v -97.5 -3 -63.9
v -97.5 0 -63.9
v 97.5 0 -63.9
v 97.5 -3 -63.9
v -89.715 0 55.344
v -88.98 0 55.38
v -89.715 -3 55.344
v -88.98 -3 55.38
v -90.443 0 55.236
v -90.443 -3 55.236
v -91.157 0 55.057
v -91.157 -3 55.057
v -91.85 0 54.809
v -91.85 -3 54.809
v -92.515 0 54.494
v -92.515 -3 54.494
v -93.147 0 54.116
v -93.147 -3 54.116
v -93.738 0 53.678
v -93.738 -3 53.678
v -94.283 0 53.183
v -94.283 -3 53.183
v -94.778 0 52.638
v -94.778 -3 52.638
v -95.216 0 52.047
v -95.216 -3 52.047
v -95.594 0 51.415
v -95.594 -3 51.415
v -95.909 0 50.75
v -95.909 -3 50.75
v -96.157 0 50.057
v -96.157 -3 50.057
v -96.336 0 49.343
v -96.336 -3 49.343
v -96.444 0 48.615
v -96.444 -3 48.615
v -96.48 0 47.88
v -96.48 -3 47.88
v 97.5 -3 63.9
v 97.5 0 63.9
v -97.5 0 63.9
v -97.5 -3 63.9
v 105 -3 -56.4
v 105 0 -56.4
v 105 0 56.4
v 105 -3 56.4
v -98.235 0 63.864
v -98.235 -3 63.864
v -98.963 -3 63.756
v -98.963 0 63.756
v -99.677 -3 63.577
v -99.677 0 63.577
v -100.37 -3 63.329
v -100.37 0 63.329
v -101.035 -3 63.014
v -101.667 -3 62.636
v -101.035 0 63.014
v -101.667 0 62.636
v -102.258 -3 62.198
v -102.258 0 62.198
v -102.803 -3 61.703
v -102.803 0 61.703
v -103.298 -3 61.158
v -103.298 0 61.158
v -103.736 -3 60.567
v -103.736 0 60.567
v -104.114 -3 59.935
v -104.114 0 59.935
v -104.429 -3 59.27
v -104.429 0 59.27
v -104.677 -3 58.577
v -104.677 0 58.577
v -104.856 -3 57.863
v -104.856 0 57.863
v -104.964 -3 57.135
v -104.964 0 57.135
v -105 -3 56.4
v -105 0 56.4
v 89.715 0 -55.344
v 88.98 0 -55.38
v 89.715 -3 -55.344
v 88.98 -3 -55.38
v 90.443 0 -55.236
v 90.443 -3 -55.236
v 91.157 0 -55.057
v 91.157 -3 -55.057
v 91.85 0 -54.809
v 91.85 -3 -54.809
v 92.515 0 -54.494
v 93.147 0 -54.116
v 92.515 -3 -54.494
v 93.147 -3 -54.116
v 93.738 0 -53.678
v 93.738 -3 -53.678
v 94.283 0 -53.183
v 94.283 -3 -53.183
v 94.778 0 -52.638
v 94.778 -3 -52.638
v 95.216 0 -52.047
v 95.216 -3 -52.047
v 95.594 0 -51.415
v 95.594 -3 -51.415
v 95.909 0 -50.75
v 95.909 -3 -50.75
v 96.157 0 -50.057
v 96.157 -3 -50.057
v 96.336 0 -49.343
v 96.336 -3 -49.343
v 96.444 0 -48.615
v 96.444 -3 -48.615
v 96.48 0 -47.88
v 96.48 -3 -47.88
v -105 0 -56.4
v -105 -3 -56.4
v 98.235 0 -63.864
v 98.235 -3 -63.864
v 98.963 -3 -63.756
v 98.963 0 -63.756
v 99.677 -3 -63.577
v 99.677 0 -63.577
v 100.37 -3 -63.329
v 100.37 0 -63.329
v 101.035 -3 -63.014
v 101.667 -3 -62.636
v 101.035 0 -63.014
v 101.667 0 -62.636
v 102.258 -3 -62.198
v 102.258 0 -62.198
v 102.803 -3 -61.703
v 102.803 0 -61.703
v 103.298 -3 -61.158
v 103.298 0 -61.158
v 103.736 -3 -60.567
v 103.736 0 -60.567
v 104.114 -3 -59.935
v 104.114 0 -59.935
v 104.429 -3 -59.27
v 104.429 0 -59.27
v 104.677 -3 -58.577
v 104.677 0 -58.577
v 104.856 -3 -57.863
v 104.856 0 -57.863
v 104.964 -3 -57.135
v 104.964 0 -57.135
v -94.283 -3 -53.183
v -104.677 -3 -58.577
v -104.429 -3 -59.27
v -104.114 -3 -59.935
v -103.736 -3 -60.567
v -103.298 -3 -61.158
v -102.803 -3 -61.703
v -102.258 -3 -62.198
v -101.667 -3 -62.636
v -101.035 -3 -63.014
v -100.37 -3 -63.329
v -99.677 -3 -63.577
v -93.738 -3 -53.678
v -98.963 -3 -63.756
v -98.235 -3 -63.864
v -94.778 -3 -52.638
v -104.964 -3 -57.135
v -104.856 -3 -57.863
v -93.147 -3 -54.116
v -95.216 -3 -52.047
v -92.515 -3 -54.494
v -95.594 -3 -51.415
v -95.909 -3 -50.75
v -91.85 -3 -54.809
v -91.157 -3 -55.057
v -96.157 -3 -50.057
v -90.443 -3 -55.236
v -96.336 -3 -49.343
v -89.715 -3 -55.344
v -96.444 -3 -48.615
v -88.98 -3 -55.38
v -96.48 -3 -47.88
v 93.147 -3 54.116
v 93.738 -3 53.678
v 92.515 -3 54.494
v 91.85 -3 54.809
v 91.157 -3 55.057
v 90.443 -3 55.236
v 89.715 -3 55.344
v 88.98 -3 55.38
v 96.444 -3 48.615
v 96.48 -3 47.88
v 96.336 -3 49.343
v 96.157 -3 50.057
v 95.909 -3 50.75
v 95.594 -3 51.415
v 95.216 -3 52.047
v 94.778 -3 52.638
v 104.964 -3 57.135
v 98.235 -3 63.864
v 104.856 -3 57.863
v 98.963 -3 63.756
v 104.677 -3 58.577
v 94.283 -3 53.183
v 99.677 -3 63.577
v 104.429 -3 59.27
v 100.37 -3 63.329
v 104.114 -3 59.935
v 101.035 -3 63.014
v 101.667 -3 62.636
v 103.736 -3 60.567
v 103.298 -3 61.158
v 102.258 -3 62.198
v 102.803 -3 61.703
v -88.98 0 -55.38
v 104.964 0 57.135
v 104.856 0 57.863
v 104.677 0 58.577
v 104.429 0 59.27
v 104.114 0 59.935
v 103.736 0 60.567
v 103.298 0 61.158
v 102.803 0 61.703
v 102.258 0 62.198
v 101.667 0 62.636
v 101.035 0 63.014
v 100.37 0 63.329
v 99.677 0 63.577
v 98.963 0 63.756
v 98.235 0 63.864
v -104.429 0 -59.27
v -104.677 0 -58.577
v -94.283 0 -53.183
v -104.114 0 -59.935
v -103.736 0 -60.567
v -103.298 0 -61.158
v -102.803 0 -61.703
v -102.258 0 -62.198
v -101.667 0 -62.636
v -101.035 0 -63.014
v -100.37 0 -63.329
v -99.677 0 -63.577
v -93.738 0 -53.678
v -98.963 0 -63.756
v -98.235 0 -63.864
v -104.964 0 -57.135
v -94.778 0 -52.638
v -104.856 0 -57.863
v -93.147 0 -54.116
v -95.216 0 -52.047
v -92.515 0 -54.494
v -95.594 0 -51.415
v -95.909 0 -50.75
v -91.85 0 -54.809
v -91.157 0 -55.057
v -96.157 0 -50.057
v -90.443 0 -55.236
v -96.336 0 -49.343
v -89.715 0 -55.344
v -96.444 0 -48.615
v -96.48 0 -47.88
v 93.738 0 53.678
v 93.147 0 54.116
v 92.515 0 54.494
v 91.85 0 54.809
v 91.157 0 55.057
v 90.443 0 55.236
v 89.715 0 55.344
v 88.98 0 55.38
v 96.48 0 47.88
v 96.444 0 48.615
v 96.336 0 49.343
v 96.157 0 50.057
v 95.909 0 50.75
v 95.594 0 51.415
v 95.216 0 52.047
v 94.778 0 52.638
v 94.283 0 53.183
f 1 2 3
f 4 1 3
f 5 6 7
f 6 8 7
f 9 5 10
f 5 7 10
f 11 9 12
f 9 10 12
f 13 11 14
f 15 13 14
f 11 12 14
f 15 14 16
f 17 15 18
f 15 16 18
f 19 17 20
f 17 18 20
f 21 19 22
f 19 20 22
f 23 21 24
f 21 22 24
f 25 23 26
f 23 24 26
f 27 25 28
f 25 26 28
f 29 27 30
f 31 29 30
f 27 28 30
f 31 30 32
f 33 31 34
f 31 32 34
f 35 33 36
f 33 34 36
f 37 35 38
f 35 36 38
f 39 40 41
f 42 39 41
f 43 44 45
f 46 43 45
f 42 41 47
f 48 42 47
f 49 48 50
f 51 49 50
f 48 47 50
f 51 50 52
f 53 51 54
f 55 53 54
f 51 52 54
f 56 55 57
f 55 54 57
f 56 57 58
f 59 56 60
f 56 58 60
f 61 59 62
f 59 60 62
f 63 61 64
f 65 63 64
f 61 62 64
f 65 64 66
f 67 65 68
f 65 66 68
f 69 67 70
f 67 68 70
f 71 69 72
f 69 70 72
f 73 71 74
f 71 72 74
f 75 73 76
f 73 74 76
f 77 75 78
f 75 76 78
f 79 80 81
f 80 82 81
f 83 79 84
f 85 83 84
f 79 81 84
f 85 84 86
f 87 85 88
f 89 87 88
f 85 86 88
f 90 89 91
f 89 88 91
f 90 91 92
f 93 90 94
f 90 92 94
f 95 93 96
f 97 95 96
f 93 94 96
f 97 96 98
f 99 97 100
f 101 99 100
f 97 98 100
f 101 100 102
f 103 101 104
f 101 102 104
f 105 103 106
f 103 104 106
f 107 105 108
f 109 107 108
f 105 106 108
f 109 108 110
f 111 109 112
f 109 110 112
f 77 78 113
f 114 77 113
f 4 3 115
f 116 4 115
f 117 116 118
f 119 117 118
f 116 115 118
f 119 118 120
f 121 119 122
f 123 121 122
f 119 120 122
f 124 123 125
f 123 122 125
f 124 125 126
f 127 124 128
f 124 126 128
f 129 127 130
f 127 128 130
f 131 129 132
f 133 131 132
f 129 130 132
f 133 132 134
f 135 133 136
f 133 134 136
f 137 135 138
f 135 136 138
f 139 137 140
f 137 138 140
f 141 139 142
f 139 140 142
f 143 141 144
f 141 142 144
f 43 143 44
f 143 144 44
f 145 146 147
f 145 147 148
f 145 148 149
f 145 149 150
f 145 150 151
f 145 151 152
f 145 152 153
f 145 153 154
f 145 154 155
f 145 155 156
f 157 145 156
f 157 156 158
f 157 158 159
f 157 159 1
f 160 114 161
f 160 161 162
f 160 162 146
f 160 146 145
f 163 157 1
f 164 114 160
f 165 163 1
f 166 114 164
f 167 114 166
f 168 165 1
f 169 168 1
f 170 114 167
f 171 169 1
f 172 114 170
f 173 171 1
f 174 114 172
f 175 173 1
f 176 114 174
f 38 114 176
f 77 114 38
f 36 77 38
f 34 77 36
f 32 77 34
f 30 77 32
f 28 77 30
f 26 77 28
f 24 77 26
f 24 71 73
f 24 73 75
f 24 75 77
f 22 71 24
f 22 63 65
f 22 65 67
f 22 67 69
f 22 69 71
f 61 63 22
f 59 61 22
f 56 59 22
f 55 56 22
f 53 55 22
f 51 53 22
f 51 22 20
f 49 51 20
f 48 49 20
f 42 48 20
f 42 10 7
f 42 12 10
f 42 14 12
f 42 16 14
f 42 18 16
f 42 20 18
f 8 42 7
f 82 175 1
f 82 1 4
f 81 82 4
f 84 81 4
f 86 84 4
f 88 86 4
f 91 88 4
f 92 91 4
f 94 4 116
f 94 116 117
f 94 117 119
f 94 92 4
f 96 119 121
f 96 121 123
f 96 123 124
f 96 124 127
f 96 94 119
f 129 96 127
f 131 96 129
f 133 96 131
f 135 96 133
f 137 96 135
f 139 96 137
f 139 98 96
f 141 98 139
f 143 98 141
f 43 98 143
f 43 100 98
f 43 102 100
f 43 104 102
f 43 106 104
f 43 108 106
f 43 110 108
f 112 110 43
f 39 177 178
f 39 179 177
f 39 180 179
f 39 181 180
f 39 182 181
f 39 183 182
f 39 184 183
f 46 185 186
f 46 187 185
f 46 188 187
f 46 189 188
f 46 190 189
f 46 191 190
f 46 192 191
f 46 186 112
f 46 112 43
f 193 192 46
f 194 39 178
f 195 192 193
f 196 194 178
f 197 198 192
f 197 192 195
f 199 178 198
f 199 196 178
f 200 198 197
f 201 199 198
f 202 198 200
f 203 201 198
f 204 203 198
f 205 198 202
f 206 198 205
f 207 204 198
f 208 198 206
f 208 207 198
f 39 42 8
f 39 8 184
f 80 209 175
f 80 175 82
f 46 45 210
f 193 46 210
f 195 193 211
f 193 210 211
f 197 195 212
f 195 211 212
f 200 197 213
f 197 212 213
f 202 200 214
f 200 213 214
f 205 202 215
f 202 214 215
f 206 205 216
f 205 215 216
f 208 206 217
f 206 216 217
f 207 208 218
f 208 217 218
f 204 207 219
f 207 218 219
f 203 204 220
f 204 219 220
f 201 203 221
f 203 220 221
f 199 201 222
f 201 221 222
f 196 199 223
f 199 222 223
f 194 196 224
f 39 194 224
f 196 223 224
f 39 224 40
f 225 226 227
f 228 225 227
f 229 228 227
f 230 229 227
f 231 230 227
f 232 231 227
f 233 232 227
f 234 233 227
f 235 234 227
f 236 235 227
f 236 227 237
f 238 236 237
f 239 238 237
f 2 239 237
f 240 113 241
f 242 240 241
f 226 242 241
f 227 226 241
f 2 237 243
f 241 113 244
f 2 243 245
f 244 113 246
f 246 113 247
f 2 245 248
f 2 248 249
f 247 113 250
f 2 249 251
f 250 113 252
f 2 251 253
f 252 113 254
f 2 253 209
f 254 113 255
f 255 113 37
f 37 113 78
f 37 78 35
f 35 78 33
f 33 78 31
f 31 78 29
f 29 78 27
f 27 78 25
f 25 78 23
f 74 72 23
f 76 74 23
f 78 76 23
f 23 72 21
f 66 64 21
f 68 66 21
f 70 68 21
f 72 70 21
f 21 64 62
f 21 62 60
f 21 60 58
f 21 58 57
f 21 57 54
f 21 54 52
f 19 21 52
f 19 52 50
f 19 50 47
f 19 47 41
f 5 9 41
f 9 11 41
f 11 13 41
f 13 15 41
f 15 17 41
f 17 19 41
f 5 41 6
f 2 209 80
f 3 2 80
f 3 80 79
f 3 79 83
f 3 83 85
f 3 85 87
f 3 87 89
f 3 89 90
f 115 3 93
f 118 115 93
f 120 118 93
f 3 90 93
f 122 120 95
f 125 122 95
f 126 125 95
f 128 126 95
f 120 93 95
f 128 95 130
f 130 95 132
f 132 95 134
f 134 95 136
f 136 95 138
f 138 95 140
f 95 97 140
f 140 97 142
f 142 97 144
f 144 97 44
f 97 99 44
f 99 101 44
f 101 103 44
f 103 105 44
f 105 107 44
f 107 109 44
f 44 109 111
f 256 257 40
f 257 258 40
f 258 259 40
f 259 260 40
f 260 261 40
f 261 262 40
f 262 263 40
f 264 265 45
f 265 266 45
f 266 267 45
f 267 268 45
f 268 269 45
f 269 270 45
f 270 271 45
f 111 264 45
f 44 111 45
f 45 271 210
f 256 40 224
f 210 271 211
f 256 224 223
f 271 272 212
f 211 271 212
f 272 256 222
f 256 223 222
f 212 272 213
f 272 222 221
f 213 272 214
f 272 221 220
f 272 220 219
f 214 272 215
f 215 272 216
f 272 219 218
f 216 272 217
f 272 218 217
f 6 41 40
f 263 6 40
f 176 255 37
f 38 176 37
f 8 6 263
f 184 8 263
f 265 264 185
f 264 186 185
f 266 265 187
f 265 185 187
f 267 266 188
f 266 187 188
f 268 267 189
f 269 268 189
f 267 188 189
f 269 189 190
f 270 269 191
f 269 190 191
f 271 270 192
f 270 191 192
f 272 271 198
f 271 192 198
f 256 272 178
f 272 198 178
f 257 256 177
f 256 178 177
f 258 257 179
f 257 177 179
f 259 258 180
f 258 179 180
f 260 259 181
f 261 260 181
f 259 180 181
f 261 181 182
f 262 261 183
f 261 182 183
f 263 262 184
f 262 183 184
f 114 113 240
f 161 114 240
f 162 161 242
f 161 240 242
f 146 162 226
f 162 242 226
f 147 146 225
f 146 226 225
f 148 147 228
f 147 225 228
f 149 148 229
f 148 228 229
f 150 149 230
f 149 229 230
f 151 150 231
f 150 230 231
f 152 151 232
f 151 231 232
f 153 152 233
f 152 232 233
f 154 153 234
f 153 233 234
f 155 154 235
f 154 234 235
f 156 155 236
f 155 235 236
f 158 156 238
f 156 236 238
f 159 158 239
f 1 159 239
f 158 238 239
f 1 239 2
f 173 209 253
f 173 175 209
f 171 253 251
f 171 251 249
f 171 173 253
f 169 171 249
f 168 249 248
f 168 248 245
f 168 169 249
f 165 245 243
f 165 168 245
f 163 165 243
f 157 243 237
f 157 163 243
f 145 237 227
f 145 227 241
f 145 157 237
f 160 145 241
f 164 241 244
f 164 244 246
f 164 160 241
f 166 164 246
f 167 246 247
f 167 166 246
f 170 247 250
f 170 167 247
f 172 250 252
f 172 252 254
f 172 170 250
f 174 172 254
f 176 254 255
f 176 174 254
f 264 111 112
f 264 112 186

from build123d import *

# Parameters (mm, degrees)
F0_W     = 192.96
F0_H     = 110.76
F1_DEPTH = 3
F2_R     = 7.5


with BuildPart() as f1:
    # F0 (on Front) → F1 (new body)
    with BuildSketch(Plane.XZ):
        with BuildLine():
            ThreePointArc((105, 56.4), (102.803301, 61.703301), (97.5, 63.9))
            Line((97.5, 63.9), (-97.5, 63.9))
            ThreePointArc((-97.5, 63.9), (-102.803301, 61.703301), (-105, 56.4))
            Line((-105, 56.4), (-105, -56.4))
            ThreePointArc((-105, -56.4), (-102.803301, -61.703301), (-97.5, -63.9))
            Line((-97.5, -63.9), (97.5, -63.9))
            ThreePointArc((97.5, -63.9), (102.803301, -61.703301), (105, -56.4))
            Line((105, -56.4), (105, 56.4))
        make_face()
        Rectangle(F0_W, F0_H, mode=Mode.SUBTRACT)
    extrude(amount=F1_DEPTH)

    # F2
    f2_edges = [f1.edges().sort_by_distance(p)[0] for p in [
        (96.48, -1.5, 55.38),
        (-96.48, -1.5, 55.38),
        (-96.48, -1.5, -55.38),
        (96.48, -1.5, -55.38),
    ]]
    fillet(f2_edges, radius=F2_R)


solid = f1.part
